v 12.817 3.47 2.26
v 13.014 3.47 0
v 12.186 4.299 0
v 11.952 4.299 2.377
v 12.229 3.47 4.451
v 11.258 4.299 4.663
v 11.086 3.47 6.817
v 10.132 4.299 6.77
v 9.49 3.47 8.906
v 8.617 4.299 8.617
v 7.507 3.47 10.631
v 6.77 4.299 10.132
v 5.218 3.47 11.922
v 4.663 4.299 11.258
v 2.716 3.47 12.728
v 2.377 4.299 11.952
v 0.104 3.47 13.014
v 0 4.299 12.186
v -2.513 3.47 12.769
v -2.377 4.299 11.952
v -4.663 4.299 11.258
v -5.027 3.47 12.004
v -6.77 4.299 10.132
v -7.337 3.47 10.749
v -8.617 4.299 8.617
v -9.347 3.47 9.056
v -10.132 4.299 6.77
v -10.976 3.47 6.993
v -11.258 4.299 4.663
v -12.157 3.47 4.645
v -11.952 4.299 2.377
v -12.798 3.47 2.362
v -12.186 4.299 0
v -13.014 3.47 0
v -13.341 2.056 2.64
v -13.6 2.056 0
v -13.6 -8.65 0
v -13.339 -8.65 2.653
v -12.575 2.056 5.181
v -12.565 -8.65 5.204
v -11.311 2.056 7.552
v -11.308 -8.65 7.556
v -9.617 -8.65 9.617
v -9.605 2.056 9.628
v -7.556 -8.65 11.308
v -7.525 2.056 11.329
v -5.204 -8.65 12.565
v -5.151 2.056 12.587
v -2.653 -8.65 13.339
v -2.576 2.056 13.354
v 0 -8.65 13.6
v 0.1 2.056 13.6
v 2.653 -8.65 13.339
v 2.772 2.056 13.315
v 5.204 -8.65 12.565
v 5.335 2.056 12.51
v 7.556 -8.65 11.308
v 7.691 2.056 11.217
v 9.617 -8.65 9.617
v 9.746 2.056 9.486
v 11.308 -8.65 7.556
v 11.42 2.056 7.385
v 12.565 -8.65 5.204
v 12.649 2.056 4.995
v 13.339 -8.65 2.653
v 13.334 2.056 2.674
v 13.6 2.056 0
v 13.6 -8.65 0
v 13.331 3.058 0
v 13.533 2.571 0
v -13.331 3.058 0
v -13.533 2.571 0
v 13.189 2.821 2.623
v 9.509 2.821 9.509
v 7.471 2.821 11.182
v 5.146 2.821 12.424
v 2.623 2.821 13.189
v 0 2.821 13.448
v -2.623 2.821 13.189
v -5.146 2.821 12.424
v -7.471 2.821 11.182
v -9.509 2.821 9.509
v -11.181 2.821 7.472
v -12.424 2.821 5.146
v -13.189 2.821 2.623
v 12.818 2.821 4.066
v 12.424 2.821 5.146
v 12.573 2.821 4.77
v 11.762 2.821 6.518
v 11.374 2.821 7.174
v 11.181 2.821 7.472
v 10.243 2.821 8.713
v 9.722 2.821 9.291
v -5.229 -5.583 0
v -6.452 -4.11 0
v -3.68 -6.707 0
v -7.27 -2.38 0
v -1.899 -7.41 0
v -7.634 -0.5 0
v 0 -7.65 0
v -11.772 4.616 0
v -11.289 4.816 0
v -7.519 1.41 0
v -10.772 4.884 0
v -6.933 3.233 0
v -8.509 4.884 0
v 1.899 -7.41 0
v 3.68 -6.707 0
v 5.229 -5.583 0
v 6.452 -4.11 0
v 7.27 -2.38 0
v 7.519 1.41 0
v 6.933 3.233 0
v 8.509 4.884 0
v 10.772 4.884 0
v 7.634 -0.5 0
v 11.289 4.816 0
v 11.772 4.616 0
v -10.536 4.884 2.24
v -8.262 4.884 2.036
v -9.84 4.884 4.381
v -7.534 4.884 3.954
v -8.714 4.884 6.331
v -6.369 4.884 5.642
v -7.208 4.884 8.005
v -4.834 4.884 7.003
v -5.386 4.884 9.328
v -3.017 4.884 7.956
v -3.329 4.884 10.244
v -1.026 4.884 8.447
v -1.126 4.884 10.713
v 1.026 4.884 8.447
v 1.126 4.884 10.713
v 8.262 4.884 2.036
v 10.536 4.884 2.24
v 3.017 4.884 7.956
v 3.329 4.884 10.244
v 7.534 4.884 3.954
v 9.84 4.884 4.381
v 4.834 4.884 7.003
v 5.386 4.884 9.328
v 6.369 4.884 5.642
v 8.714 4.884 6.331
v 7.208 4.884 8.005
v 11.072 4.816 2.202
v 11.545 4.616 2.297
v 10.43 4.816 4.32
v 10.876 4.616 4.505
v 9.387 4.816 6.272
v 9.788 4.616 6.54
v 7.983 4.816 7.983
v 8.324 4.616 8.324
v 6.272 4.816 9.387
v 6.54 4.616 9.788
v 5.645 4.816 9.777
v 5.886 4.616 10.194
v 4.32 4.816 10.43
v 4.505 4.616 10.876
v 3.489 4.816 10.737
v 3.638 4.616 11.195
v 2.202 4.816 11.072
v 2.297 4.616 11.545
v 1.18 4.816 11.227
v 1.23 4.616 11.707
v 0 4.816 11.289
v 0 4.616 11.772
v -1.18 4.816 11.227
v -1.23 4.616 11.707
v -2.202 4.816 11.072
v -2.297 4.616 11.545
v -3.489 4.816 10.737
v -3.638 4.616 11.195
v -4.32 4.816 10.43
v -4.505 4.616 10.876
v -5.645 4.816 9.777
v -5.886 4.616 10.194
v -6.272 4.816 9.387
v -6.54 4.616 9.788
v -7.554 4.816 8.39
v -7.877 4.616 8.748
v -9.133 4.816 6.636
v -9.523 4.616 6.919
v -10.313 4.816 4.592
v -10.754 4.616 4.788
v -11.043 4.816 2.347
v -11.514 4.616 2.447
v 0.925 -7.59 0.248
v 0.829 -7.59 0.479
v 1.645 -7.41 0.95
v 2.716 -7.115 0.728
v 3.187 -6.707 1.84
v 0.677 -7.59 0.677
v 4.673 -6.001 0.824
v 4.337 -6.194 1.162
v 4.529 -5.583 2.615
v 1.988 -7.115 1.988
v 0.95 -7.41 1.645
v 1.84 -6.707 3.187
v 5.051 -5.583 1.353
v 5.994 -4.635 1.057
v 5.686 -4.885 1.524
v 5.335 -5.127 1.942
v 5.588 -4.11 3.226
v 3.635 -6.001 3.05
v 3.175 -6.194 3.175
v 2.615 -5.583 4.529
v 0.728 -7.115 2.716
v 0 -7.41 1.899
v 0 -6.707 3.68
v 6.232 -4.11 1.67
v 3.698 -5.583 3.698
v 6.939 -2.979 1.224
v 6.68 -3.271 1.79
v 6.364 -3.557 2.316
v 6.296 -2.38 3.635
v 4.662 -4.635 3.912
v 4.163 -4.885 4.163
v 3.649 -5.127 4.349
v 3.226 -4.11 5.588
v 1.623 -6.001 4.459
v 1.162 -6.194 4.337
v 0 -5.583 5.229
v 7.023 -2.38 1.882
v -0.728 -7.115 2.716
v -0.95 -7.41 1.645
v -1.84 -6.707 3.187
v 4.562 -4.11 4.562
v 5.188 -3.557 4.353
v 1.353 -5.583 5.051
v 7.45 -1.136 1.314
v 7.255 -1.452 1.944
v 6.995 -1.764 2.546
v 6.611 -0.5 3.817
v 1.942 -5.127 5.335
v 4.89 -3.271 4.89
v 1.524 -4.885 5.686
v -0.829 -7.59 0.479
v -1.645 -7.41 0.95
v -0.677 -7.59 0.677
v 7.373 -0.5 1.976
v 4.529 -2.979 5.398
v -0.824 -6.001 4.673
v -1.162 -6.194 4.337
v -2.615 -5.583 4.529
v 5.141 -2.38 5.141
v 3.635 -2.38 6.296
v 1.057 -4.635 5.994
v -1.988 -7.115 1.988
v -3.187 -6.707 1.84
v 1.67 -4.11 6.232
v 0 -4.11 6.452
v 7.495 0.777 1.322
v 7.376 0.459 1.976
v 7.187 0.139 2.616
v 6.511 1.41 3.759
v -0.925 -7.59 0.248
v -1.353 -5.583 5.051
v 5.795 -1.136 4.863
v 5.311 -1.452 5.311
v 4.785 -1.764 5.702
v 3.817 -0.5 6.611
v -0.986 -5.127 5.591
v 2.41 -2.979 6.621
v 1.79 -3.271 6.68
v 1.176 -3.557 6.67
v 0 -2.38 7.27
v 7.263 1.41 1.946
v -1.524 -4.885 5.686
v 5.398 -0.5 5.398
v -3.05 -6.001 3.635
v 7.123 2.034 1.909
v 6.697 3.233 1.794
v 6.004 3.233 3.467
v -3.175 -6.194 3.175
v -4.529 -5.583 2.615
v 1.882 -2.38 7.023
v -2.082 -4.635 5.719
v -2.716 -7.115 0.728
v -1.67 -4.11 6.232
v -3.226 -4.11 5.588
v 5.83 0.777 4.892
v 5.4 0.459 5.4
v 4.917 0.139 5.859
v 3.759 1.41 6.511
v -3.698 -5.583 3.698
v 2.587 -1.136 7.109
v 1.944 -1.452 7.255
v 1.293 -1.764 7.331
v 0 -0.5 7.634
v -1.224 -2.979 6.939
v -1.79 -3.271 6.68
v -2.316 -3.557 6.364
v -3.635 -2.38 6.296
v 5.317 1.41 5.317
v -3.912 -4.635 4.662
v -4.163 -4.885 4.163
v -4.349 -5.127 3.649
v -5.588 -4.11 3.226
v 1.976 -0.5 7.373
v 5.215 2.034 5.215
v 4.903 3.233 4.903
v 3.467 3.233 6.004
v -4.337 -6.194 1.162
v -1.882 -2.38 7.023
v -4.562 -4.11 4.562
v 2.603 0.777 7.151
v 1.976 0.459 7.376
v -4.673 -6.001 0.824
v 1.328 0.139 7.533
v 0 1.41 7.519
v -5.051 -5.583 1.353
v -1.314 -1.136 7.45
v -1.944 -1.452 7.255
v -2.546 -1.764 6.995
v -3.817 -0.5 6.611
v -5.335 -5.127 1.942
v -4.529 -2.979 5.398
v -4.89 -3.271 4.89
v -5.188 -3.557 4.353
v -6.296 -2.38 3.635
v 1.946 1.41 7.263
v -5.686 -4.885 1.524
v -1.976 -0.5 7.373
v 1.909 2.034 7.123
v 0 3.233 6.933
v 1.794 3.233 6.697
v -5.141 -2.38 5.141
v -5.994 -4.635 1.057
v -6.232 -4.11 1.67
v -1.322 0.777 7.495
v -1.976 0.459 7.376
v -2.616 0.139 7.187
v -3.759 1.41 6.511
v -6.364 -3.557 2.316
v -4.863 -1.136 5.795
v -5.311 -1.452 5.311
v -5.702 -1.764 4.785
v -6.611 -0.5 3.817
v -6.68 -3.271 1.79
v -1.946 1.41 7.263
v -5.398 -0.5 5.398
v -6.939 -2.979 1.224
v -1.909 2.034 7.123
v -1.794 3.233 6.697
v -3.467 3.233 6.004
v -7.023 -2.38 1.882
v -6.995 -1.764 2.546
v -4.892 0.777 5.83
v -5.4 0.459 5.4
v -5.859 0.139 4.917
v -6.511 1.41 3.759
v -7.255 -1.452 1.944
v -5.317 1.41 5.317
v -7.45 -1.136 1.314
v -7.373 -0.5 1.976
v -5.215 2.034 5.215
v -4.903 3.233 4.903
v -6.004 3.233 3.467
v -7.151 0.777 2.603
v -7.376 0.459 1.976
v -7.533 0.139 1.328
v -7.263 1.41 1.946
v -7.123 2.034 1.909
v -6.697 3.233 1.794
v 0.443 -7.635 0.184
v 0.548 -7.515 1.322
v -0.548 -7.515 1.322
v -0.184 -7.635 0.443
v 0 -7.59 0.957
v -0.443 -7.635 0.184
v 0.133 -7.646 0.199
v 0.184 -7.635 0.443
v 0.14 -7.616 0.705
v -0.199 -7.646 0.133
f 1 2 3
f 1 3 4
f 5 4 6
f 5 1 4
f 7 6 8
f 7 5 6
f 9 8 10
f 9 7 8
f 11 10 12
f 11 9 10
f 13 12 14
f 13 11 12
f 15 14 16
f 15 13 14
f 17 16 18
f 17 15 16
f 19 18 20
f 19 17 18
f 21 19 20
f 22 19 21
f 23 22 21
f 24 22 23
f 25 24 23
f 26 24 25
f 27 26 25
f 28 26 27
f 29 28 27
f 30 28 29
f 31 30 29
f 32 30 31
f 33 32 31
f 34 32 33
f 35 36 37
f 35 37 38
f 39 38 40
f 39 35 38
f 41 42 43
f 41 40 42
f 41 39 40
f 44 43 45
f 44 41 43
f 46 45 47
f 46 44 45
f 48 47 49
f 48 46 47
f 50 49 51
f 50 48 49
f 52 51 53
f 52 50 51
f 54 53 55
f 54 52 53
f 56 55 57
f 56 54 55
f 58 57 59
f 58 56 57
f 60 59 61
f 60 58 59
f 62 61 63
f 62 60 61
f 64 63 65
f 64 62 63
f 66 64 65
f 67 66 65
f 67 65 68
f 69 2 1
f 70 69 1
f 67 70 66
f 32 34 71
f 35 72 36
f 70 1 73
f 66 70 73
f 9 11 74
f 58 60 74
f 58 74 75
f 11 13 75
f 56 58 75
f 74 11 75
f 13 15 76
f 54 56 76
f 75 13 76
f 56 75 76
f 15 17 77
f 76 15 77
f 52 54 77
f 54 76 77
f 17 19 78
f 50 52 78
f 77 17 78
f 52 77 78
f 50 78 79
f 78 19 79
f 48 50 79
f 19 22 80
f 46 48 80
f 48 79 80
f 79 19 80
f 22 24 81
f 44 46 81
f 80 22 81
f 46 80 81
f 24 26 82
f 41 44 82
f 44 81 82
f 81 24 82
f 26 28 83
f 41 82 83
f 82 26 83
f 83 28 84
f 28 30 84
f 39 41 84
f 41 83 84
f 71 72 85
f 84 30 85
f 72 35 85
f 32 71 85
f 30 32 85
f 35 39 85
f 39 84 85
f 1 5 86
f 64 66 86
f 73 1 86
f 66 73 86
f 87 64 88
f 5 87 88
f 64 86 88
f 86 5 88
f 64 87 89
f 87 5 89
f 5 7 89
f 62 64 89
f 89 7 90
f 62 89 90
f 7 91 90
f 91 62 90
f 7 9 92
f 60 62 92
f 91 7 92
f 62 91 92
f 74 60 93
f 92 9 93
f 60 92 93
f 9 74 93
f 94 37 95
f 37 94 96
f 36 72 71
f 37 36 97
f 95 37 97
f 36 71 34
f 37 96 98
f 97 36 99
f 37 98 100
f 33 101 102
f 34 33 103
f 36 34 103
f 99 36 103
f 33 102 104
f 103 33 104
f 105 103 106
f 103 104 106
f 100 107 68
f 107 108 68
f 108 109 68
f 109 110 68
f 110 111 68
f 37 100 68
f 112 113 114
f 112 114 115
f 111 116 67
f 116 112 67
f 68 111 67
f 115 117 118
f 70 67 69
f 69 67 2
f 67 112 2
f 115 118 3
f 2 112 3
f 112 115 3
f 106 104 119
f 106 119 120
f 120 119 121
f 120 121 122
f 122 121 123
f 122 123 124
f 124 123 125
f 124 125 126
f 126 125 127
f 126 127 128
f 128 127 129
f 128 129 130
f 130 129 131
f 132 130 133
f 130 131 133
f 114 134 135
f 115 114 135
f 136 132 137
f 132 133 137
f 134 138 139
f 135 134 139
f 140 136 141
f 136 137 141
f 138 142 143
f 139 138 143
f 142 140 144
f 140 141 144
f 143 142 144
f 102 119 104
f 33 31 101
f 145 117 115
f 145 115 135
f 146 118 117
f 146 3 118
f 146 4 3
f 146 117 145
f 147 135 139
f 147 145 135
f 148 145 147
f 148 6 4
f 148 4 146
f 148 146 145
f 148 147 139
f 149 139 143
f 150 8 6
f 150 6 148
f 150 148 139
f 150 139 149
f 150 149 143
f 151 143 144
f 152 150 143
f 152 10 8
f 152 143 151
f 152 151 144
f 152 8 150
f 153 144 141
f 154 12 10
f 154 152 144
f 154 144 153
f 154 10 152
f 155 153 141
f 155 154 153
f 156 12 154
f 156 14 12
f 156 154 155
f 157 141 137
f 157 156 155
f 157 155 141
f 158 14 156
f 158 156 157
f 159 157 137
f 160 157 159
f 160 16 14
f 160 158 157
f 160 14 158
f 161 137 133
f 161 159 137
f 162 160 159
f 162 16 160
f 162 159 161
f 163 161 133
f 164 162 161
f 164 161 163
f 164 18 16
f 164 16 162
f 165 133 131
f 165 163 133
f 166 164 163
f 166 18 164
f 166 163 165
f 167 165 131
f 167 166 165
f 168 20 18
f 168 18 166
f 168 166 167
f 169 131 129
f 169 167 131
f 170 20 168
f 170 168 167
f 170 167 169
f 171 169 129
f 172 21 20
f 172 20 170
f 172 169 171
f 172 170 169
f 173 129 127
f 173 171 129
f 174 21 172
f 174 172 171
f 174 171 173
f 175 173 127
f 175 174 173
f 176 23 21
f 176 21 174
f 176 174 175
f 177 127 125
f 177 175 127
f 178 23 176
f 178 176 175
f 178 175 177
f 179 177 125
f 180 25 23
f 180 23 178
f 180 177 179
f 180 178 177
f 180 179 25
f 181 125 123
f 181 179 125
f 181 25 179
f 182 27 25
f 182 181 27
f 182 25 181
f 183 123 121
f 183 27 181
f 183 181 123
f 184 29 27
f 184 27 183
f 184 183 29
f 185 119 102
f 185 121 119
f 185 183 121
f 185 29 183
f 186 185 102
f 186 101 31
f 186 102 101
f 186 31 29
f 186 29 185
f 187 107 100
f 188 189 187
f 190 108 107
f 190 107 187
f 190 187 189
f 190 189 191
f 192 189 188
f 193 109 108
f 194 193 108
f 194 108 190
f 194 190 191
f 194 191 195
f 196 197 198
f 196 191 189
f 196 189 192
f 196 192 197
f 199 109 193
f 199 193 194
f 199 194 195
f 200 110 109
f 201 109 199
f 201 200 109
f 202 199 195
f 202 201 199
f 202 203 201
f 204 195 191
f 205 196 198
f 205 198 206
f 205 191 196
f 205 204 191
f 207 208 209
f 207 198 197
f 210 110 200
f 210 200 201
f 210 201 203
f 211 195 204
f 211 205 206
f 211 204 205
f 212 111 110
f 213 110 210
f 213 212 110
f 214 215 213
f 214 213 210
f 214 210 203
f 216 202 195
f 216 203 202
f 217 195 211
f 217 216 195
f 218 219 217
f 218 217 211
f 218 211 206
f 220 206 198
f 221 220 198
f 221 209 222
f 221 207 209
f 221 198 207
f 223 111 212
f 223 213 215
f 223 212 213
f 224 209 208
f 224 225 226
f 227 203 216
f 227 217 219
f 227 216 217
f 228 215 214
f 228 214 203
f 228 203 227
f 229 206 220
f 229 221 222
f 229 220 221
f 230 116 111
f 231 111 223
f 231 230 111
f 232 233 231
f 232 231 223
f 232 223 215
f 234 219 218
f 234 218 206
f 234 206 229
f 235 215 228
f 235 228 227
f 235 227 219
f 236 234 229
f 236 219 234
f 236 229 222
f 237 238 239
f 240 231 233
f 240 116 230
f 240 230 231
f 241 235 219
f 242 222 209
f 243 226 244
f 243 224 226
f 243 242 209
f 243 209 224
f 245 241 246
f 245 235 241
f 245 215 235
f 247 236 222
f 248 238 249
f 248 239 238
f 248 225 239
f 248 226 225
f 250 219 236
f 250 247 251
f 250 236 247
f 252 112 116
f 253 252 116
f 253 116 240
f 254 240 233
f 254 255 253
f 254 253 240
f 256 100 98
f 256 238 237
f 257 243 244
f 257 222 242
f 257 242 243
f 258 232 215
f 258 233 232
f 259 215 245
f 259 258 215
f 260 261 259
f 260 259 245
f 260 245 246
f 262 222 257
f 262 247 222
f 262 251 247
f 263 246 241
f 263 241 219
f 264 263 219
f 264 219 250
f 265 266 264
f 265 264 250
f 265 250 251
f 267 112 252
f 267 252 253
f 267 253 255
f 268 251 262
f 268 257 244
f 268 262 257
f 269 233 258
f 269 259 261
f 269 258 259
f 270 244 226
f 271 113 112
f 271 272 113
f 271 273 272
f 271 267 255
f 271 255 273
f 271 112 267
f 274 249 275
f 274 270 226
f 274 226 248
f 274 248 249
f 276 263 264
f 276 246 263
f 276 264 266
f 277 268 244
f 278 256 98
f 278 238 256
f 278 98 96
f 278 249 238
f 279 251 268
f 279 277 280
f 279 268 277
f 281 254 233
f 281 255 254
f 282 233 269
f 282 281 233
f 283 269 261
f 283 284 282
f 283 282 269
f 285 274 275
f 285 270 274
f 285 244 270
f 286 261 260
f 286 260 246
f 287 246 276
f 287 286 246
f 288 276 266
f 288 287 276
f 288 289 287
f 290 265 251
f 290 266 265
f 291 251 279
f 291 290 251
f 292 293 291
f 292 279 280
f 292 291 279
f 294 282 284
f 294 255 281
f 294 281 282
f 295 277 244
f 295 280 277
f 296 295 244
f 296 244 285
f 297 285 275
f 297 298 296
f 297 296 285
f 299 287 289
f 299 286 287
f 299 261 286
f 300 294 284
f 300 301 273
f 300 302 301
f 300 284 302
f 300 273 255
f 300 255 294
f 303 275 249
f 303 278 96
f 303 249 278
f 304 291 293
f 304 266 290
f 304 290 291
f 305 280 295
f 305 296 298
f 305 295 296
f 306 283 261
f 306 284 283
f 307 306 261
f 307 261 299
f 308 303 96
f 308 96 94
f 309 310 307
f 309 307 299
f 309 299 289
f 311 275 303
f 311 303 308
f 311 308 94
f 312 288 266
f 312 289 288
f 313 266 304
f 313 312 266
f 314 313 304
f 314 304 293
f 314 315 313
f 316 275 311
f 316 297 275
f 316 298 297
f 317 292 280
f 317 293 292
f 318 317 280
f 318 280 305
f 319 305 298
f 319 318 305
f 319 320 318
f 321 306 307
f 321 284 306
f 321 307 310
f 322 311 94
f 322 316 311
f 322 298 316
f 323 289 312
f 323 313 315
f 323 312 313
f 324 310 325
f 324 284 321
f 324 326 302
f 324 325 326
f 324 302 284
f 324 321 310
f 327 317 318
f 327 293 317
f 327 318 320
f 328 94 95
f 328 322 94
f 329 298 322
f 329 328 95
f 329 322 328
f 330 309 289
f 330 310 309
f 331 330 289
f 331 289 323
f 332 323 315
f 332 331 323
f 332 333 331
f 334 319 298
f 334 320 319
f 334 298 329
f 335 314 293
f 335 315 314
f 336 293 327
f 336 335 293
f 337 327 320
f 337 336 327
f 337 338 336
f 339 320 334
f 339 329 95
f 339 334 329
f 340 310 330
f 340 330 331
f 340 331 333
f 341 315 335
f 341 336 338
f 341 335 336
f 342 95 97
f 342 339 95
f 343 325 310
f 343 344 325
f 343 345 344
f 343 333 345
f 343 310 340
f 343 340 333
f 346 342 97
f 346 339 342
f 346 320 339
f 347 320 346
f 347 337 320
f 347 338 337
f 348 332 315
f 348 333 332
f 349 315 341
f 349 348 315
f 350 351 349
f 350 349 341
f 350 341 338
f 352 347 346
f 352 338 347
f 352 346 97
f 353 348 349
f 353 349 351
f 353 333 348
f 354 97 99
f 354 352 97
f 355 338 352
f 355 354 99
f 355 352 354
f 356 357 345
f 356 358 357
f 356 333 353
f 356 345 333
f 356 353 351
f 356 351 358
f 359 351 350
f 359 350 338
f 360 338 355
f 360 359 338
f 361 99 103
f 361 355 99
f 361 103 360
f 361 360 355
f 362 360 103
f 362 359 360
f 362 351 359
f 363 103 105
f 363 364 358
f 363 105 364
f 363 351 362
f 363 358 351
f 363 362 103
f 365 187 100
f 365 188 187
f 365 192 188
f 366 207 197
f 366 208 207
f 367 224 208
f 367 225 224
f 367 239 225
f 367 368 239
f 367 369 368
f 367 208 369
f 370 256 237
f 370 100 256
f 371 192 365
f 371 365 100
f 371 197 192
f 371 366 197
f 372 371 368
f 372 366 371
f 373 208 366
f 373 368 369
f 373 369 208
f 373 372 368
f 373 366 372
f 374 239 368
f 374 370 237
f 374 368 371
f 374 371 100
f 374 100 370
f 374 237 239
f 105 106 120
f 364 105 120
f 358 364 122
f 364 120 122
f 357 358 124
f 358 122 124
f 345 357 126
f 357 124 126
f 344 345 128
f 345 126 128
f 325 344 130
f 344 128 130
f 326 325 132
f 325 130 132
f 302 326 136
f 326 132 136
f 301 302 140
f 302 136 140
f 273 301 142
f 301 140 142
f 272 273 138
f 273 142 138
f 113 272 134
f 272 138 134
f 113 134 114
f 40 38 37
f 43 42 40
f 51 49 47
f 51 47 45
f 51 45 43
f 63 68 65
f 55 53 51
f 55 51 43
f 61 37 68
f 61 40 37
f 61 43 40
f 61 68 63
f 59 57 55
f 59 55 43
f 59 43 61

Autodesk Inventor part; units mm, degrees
sketch "스케치1" plane through (0, 0, 0) normal (0, 0, 1) x (1, 0, 0)
  arc A0 (0, -7.65) -> (5.8602, 4.9173) centre (0, 0) ccw
  line L0 (0, -7.65) -> (0, -8.65)
  line L1 (0, -8.65) -> (13.6, -8.65)
  line L2 (13.6, -8.65) -> (13.6, 4.8843)
  line L3 (0, 0) -> (7.5, 0) construction
  line L4 (8.5089, 4.8843) -> (13.6, 4.8843)
  line L5 (0, 0) -> (0, 6.3672)
  line L6 (8.5089, 4.8843) -> (6.9333, 3.233)
  dimension "d0" = 15.3
  dimension "d1" = 1
  dimension "d2" = 13.6
revolve "회전1" add sketch "스케치1" angle 180 about axis through (0, 0, 0) along (0, -1, 0)
sketch "스케치3" plane through (0, 0, 0) normal (0, 0, 1) x (1, 0, 0)
  circle A0 centre (0, 0) radius 2
  dimension "d8" = 4
extrude "돌출2" cut sketch "스케치3" along normal mid plane 12
sketch "스케치4" plane through (0, 0, 0) normal (0, 0, 1) x (1, 0, 0)
  point P0 (0, 0)
  point P1 (0, 0)
sketch "스케치6" plane through (0, 0, 0) normal (0, 0, 1) x (1, 0, 0)
  point P0 (0, 0)
  point P1 (0, 0)
ref_plane "작업 평면1" through (13.6, 4.8843, 7.5) normal (0, 0, -1) x (-1, 0, 0)
ref_plane "작업 평면2" through (13.6, 4.8843, 7.5) normal (0, 0, -1) x (-1, 0, 0)
chamfer "모따기1" distance 2 angle 45 1 edges at (0, 4.8843, 13.6)
ref_plane "작업 평면3" through (0, -1.8829, 13.6) normal (0, 0, -1) x (-1, 0, 0)
ref_plane "작업 평면4" through (0, 0, 7.5) normal (0, 0, -1) x (-1, 0, 0)
fillet "모깎기2" radius 2 2 edges at (0, 2.8843, 13.6) (0, 4.8843, 11.6)
properties part number "ball socket"
